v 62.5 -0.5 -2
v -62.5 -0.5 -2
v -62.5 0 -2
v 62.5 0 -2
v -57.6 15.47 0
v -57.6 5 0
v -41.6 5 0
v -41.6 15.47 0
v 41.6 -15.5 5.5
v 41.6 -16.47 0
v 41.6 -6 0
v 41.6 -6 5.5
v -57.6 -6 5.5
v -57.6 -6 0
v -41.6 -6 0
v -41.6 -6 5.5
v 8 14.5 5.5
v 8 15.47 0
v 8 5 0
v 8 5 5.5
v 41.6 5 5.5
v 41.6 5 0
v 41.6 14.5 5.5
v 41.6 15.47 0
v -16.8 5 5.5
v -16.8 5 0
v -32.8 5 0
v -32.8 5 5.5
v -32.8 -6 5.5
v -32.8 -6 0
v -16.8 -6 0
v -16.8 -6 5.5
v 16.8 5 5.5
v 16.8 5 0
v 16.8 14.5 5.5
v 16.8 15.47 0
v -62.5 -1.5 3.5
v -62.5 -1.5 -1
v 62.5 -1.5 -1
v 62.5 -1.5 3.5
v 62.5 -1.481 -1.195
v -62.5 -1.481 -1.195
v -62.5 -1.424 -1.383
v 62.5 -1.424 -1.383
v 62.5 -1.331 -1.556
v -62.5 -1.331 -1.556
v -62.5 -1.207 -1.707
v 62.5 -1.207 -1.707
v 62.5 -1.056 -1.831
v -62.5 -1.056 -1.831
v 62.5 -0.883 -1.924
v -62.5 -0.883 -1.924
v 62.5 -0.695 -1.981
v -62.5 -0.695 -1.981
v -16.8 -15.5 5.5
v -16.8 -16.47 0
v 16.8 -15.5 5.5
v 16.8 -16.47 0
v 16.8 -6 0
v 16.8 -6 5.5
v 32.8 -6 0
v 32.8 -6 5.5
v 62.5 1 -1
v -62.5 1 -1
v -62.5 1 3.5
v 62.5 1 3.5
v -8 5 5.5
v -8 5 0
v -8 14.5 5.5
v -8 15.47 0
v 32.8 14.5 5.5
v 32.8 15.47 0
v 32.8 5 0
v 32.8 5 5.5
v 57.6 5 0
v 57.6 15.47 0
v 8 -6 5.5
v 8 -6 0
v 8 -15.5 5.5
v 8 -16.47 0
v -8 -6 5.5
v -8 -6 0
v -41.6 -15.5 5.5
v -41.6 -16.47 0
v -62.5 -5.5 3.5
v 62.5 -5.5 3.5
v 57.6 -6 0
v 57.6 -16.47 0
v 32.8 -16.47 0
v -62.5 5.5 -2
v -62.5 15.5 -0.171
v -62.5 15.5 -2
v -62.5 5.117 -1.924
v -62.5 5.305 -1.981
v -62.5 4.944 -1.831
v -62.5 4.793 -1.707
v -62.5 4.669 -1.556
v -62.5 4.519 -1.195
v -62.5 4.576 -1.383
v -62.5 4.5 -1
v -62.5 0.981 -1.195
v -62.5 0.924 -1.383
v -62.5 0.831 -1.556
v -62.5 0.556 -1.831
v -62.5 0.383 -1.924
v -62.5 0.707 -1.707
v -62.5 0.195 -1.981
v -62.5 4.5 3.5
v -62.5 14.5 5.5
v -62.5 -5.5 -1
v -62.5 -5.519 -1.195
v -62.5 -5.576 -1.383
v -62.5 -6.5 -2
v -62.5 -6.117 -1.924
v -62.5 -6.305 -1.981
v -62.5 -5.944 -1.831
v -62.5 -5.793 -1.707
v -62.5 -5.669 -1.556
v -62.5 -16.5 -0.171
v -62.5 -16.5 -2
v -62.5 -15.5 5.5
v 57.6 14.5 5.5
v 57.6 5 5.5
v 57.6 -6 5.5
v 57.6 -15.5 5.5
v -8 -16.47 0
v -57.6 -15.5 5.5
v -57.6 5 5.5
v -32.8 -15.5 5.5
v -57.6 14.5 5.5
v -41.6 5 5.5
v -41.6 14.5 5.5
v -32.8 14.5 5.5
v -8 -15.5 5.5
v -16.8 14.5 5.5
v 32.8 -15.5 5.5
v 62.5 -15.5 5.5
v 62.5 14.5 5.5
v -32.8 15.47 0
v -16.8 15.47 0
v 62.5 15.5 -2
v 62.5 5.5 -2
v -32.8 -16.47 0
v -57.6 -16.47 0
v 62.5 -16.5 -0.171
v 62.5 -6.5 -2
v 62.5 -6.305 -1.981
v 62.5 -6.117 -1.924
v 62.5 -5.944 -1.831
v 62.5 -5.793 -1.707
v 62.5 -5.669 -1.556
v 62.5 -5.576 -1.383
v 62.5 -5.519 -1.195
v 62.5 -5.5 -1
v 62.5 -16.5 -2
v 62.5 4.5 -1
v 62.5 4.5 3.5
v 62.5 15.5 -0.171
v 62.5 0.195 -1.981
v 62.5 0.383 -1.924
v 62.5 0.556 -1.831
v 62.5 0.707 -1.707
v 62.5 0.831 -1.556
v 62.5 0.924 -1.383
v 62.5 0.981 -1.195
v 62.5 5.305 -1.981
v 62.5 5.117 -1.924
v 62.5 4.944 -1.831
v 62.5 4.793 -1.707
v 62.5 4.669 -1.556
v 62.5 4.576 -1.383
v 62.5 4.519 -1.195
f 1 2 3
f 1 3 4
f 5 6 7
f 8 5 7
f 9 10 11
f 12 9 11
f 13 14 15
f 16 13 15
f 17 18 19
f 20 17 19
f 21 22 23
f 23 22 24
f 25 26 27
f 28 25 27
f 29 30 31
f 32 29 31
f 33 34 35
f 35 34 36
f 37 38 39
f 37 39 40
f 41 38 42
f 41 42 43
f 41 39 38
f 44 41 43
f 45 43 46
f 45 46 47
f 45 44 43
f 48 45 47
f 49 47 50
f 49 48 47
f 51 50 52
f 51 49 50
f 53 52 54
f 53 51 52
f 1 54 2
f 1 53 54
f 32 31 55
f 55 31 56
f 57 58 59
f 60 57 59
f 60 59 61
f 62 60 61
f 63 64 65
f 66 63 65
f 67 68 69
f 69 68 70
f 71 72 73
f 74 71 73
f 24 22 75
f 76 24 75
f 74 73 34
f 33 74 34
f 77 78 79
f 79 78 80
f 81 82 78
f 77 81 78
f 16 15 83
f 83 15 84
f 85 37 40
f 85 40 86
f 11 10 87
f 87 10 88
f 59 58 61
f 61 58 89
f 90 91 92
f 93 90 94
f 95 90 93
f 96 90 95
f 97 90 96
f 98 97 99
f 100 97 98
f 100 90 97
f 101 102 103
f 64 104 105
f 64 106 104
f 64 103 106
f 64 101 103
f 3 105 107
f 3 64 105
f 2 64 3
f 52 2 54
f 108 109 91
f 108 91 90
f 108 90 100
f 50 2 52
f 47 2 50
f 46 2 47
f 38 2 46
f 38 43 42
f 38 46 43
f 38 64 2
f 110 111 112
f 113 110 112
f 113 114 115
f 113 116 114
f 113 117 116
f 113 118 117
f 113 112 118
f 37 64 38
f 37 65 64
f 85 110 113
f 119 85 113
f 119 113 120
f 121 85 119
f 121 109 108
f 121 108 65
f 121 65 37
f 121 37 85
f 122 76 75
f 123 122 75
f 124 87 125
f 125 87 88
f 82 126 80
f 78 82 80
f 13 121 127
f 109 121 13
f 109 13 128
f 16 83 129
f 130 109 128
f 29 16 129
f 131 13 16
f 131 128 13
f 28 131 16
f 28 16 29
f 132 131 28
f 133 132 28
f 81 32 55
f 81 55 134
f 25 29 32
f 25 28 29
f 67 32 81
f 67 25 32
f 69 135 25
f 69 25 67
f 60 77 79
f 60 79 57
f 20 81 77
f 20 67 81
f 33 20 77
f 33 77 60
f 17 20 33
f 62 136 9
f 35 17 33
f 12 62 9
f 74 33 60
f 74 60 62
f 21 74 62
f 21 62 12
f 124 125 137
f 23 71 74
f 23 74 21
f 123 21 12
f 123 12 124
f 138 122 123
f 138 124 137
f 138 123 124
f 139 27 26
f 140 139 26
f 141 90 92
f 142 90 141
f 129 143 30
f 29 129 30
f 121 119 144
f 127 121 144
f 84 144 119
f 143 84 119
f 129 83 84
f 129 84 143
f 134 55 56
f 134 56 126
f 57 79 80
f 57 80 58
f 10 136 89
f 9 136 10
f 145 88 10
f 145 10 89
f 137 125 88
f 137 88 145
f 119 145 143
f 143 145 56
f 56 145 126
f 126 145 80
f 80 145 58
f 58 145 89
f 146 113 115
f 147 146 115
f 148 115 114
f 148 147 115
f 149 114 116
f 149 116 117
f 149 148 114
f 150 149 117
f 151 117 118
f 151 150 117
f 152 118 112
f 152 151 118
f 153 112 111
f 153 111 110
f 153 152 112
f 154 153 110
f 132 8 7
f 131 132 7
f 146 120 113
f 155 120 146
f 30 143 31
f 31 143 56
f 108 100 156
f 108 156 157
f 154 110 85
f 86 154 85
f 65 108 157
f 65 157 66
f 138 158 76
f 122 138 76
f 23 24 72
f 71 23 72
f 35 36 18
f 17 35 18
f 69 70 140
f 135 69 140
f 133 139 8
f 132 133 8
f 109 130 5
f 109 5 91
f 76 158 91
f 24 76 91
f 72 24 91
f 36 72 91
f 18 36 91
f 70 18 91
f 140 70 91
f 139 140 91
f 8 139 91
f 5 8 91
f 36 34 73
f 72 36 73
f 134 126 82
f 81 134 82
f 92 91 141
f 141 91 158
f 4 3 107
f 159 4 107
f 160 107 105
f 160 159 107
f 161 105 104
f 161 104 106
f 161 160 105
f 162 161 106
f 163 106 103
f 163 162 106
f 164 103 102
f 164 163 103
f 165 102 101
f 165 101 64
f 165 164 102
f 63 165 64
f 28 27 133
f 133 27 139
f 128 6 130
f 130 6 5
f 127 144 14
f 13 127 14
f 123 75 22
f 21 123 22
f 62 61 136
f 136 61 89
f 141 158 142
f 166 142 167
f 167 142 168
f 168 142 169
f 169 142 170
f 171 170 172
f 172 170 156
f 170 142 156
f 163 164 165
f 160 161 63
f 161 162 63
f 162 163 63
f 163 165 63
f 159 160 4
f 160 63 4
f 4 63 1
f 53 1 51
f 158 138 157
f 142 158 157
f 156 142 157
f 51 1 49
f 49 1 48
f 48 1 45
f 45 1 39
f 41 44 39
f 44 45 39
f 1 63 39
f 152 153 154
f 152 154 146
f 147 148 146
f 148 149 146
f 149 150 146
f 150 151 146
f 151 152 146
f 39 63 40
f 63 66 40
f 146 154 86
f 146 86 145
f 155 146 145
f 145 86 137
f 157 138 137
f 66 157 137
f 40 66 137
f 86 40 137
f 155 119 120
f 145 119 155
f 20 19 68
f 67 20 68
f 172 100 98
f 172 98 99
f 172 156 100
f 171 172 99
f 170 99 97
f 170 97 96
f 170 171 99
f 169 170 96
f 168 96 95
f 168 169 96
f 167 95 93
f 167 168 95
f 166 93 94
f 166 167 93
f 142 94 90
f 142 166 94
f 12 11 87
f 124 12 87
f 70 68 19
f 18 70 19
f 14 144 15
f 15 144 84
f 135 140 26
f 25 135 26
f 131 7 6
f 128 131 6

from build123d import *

# Parameters (mm, degrees)
F1_DEPTH    = 5.5
F2_W        = 125
F2_H        = 32
F3_DEPTH    = 2
F4_W        = 3.5
F4_H        = 5.5
F4_W_2      = 4
F5_DEPTH    = 125
F6_R        = 1
F7_C1_SIZE2 = 1
F7_C1_SIZE  = 5.6712818196
F7_C2_SIZE2 = 5.6712818196
F7_C2_SIZE  = 1


with BuildPart() as f1:
    # F0 (on Top) → F1 (new body)
    with BuildSketch(Plane.XY):
        Polygon((57.6, -16.5), (62.5, -16.5), (62.5, 15.5), (57.6, 15.5), (57.6, 5), (41.6, 5), (41.6, 15.5), (32.8, 15.5), (32.8, 5), (16.8, 5), (16.8, 15.5), (8, 15.5), (8, 5), (-8, 5), (-8, 15.5), (-16.8, 15.5), (-16.8, 5), (-32.8, 5), (-32.8, 15.5), (-41.6, 15.5), (-41.6, 5), (-57.6, 5), (-57.6, 15.5), (-62.5, 15.5), (-62.5, -16.5), (-57.6, -16.5), (-57.6, -6), (-41.6, -6), (-41.6, -16.5), (-32.8, -16.5), (-32.8, -6), (-16.8, -6), (-16.8, -16.5), (-8, -16.5), (-8, -6), (8, -6), (8, -16.5), (16.8, -16.5), (16.8, -6), (32.8, -6), (32.8, -16.5), (41.6, -16.5), (41.6, -6), (57.6, -6), align=None)
    extrude(amount=F1_DEPTH)

    # F2 (on face) → F3 (join)
    with BuildSketch(Plane(origin=(0, 0, 0), x_dir=(1, 0, 0), z_dir=(0, 0, -1))):
        with Locations((0, 0.5)):
            Rectangle(F2_W, F2_H)
    extrude(amount=F3_DEPTH)

    # F4 (on face) → F5 (cut, through all)
    with BuildSketch(Plane(origin=(-62.5, 0, 0), x_dir=(0, -1, 0), z_dir=(-1, 0, 0))):
        with Locations((-2.75, 0.75)):
            Rectangle(F4_W, F4_H)
        with Locations((3.5, 0.75)):
            Rectangle(F4_W_2, F4_H)
    extrude(amount=-F5_DEPTH, mode=Mode.SUBTRACT)

    # F6
    f6_edges = [f1.edges().sort_by_distance(p)[0] for p in [
        (0, 4.5, -2),
        (0, 1, -2),
        (0, -5.5, -2),
        (0, -1.5, -2),
    ]]
    fillet(f6_edges, radius=F6_R)

    # F7: chamfer of 1 x 5.6712818196 on 12 edges, made by hand

    # F7_c1
    f7_c1_edges = [f1.edges().sort_by_distance(p)[0] for p in [
        (-12.4, -16.5, 5.5),
    ]]
    f7_c1_side = f1.faces().sort_by_distance((-12.4, -16.5, 5.48))[0]
    chamfer(f7_c1_edges, length=F7_C1_SIZE, length2=F7_C1_SIZE2, reference=f7_c1_side)

    # F7_c2
    f7_c2_edges = [f1.edges().sort_by_distance(p)[0] for p in [
        (12.4, 15.5, 5.5),
    ]]
    f7_c2_side = f1.faces().sort_by_distance((12.4, 15.48, 5.5))[0]
    chamfer(f7_c2_edges, length=F7_C2_SIZE, length2=F7_C2_SIZE2, reference=f7_c2_side)


solid = f1.part
